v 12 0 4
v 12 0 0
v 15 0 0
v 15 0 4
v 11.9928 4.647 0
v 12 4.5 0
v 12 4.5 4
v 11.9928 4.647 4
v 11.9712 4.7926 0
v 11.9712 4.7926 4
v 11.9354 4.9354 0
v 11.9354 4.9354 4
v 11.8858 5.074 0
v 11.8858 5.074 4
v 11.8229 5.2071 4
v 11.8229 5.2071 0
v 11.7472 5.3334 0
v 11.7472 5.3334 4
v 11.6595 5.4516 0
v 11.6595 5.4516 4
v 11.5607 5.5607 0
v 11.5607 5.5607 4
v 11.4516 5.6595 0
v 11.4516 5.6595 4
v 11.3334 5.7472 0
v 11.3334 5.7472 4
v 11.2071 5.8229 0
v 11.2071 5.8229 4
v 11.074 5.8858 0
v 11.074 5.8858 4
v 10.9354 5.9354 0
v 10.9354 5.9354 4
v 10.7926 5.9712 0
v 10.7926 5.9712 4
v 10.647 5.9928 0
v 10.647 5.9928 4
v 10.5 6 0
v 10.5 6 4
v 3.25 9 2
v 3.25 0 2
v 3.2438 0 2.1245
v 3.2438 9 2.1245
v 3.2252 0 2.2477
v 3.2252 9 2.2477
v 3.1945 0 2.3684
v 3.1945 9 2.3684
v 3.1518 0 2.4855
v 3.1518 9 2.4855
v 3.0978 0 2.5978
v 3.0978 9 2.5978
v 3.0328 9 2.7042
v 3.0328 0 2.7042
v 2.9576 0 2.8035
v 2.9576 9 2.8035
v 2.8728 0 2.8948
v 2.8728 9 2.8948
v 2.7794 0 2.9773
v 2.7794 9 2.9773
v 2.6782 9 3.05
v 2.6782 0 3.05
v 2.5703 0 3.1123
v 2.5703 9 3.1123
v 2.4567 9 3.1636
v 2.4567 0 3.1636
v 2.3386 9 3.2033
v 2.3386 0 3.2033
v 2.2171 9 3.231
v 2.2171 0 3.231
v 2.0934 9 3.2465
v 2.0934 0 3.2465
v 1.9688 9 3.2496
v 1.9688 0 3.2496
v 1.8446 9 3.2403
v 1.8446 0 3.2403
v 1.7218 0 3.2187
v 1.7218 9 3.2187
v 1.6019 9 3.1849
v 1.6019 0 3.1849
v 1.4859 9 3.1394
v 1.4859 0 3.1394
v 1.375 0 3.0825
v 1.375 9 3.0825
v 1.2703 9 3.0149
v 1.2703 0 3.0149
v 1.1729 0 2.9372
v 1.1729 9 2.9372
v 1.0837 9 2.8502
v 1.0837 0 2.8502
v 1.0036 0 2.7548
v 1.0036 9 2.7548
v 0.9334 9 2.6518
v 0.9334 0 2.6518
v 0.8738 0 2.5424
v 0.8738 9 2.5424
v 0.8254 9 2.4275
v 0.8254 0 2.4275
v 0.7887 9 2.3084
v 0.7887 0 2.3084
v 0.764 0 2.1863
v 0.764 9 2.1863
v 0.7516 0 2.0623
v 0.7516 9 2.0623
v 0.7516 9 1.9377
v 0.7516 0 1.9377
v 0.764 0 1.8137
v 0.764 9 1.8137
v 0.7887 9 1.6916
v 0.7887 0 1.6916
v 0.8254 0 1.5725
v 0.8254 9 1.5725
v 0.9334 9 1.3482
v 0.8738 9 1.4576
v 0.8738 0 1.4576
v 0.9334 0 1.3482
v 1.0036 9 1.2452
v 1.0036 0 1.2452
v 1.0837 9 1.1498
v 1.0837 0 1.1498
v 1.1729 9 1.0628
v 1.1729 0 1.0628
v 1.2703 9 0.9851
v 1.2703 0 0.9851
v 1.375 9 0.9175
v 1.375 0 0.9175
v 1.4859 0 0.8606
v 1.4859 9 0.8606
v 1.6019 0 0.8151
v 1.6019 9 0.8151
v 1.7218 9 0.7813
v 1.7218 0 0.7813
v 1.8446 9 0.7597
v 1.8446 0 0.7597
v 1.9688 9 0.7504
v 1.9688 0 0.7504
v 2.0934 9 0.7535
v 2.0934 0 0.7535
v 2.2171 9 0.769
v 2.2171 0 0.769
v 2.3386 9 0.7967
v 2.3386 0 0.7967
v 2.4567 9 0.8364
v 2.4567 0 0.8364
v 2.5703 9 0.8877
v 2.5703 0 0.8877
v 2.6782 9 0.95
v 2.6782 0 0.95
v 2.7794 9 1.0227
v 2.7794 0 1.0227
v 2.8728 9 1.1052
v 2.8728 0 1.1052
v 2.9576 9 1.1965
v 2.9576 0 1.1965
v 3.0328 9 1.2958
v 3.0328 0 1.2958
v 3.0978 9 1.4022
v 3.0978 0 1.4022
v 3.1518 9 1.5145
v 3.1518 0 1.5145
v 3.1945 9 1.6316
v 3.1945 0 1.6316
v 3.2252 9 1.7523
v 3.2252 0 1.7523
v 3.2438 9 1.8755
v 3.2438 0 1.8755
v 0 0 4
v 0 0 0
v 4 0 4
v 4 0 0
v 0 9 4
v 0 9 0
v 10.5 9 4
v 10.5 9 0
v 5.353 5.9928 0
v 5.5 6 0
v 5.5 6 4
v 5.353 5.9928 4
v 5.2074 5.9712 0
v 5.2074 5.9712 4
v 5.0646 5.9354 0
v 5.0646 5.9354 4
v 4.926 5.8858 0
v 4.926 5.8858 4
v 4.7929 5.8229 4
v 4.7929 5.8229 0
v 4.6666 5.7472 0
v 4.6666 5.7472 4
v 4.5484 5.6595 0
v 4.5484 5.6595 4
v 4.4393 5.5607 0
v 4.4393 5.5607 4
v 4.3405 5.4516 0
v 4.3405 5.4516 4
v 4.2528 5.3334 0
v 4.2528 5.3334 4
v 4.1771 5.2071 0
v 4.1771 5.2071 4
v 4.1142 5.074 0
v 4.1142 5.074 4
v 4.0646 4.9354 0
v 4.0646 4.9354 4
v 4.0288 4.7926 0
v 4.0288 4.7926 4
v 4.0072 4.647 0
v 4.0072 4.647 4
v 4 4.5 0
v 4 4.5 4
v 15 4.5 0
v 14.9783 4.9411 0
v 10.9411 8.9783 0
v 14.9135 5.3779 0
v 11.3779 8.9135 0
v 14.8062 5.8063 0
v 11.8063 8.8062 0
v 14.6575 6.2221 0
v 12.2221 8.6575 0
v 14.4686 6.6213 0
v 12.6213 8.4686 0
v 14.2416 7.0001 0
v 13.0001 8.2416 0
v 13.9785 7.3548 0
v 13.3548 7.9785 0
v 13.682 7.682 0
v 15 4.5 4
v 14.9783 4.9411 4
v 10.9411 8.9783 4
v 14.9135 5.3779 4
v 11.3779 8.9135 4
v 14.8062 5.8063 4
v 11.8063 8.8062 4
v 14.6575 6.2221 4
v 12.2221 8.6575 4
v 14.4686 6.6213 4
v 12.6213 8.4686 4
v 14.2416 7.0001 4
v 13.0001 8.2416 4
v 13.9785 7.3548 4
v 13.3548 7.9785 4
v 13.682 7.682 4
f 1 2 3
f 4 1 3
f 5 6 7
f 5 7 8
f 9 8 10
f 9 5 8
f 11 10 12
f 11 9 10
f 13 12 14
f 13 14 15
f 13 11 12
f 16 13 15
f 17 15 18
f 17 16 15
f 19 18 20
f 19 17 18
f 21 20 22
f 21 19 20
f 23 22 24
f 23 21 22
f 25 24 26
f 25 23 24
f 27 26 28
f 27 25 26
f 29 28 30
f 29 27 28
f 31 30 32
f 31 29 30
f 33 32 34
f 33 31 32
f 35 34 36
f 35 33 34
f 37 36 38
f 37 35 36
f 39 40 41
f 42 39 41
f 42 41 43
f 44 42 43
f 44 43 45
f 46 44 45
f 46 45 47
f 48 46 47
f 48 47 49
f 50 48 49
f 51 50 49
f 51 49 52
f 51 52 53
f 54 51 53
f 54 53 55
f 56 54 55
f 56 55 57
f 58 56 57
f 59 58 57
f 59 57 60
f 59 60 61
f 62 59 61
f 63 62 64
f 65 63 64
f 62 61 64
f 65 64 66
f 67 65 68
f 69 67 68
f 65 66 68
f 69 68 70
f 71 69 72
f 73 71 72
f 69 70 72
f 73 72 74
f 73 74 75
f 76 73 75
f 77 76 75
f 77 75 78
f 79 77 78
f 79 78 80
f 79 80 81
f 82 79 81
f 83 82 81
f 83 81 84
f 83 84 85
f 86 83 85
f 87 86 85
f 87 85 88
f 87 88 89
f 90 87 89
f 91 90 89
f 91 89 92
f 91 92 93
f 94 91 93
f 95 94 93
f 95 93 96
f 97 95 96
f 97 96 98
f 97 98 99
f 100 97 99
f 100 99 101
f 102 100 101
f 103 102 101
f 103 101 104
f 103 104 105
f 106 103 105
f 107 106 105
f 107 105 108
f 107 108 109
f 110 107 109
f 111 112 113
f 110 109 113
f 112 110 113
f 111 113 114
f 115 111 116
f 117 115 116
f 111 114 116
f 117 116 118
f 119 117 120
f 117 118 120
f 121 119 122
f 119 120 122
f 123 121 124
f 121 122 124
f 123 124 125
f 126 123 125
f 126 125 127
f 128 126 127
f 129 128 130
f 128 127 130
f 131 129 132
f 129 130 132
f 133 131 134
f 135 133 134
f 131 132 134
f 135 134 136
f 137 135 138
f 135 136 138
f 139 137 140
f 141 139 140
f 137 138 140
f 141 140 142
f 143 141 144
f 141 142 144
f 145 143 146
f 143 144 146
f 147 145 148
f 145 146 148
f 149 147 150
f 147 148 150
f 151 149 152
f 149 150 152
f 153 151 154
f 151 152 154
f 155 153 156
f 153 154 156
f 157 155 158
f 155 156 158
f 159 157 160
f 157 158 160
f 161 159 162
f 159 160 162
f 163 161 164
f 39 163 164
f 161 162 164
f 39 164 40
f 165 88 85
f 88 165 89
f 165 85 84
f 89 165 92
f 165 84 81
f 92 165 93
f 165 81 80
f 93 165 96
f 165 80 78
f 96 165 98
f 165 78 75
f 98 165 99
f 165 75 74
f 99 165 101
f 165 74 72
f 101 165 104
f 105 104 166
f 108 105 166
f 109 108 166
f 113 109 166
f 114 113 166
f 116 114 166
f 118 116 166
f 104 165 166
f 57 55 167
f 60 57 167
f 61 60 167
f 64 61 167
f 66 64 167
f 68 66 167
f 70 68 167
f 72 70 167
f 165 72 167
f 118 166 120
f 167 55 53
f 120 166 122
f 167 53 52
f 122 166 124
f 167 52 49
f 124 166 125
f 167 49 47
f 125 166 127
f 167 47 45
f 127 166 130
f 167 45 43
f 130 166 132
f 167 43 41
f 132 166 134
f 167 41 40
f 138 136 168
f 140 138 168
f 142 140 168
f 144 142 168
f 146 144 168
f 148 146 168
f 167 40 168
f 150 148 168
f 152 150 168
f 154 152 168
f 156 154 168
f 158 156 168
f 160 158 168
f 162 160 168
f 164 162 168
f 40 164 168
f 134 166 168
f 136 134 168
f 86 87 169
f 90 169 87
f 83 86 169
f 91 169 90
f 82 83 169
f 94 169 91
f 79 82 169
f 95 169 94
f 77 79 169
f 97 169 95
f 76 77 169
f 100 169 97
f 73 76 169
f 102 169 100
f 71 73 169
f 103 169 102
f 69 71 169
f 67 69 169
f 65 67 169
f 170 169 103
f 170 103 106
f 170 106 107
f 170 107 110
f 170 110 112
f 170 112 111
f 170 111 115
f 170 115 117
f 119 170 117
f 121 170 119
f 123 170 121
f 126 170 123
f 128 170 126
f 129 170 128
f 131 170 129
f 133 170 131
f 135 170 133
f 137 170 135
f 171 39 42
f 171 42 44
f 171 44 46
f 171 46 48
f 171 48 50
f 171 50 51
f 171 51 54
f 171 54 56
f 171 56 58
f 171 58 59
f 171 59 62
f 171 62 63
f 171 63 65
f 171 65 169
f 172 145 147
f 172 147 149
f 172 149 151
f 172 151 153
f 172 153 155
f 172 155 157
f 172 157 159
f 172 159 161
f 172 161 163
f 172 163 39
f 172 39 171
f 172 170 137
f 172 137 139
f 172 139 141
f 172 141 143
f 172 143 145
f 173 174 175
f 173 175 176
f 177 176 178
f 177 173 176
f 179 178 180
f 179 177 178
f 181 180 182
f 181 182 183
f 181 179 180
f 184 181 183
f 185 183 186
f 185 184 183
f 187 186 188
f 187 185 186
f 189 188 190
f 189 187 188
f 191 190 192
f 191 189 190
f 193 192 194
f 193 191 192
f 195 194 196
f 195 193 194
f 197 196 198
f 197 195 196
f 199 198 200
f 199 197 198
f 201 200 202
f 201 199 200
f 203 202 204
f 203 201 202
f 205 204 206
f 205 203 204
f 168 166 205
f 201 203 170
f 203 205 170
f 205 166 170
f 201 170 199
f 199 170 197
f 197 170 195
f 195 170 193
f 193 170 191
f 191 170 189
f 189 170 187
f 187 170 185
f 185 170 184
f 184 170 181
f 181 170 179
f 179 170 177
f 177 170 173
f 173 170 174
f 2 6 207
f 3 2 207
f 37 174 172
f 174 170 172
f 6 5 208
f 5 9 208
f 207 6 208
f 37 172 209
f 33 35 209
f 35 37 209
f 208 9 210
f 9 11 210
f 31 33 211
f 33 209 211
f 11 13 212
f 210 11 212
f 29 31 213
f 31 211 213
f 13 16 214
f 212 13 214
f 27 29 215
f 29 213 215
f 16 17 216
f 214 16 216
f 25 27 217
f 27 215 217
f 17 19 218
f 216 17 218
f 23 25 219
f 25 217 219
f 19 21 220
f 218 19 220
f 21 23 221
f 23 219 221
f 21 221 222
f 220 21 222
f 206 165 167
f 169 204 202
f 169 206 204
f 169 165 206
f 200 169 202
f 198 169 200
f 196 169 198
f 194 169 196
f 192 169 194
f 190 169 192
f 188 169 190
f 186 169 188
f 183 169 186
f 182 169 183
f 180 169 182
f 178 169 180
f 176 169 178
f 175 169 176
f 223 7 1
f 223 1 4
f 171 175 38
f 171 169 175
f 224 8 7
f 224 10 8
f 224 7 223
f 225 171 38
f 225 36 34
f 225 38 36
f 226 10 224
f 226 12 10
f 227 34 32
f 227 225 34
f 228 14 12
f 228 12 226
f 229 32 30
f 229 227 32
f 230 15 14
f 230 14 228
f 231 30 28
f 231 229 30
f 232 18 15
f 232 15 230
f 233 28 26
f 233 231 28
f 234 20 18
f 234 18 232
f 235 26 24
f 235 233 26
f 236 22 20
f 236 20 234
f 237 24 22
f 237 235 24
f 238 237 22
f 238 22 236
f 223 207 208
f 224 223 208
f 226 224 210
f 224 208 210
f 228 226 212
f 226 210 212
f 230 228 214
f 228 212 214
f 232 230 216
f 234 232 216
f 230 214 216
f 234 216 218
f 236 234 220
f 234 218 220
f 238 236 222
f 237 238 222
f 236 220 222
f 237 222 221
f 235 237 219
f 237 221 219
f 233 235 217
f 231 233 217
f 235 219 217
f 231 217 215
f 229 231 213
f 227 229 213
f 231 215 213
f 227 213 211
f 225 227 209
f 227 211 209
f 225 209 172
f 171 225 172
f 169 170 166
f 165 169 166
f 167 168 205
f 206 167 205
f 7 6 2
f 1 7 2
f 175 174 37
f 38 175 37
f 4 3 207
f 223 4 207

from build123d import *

# Parameters (mm, degrees)
PAD_DEPTH    = 4
SKETCH001_R  = 1.25
POCKET_DEPTH = 9.001


with BuildPart() as part:
    # Sketch → Pad (new body)
    with BuildSketch(Plane.XY):
        with BuildLine():
            Line((0, 0), (4, 0))
            Line((4, 0), (4, 4.5))
            ThreePointArc((5.5, 6), (4.43934, 5.56066), (4, 4.5))
            Line((5.5, 6), (10.5, 6))
            ThreePointArc((12, 4.5), (11.56066, 5.56066), (10.5, 6))
            Line((12, 4.5), (12, 0))
            Line((12, 0), (15, 0))
            Line((15, 0), (15, 4.5))
            ThreePointArc((15, 4.5), (13.681981, 7.681981), (10.5, 9))
            Line((0, 9), (10.5, 9))
            Line((0, 9), (0, 0))
        make_face()
    extrude(amount=PAD_DEPTH)

    # Sketch001 (on Face2 of Pad) → Pocket (cut, through all)
    with BuildSketch(Plane.XZ):
        with Locations((2, 2)):
            Circle(SKETCH001_R)
    extrude(amount=-POCKET_DEPTH, mode=Mode.SUBTRACT)


solid = part.part
